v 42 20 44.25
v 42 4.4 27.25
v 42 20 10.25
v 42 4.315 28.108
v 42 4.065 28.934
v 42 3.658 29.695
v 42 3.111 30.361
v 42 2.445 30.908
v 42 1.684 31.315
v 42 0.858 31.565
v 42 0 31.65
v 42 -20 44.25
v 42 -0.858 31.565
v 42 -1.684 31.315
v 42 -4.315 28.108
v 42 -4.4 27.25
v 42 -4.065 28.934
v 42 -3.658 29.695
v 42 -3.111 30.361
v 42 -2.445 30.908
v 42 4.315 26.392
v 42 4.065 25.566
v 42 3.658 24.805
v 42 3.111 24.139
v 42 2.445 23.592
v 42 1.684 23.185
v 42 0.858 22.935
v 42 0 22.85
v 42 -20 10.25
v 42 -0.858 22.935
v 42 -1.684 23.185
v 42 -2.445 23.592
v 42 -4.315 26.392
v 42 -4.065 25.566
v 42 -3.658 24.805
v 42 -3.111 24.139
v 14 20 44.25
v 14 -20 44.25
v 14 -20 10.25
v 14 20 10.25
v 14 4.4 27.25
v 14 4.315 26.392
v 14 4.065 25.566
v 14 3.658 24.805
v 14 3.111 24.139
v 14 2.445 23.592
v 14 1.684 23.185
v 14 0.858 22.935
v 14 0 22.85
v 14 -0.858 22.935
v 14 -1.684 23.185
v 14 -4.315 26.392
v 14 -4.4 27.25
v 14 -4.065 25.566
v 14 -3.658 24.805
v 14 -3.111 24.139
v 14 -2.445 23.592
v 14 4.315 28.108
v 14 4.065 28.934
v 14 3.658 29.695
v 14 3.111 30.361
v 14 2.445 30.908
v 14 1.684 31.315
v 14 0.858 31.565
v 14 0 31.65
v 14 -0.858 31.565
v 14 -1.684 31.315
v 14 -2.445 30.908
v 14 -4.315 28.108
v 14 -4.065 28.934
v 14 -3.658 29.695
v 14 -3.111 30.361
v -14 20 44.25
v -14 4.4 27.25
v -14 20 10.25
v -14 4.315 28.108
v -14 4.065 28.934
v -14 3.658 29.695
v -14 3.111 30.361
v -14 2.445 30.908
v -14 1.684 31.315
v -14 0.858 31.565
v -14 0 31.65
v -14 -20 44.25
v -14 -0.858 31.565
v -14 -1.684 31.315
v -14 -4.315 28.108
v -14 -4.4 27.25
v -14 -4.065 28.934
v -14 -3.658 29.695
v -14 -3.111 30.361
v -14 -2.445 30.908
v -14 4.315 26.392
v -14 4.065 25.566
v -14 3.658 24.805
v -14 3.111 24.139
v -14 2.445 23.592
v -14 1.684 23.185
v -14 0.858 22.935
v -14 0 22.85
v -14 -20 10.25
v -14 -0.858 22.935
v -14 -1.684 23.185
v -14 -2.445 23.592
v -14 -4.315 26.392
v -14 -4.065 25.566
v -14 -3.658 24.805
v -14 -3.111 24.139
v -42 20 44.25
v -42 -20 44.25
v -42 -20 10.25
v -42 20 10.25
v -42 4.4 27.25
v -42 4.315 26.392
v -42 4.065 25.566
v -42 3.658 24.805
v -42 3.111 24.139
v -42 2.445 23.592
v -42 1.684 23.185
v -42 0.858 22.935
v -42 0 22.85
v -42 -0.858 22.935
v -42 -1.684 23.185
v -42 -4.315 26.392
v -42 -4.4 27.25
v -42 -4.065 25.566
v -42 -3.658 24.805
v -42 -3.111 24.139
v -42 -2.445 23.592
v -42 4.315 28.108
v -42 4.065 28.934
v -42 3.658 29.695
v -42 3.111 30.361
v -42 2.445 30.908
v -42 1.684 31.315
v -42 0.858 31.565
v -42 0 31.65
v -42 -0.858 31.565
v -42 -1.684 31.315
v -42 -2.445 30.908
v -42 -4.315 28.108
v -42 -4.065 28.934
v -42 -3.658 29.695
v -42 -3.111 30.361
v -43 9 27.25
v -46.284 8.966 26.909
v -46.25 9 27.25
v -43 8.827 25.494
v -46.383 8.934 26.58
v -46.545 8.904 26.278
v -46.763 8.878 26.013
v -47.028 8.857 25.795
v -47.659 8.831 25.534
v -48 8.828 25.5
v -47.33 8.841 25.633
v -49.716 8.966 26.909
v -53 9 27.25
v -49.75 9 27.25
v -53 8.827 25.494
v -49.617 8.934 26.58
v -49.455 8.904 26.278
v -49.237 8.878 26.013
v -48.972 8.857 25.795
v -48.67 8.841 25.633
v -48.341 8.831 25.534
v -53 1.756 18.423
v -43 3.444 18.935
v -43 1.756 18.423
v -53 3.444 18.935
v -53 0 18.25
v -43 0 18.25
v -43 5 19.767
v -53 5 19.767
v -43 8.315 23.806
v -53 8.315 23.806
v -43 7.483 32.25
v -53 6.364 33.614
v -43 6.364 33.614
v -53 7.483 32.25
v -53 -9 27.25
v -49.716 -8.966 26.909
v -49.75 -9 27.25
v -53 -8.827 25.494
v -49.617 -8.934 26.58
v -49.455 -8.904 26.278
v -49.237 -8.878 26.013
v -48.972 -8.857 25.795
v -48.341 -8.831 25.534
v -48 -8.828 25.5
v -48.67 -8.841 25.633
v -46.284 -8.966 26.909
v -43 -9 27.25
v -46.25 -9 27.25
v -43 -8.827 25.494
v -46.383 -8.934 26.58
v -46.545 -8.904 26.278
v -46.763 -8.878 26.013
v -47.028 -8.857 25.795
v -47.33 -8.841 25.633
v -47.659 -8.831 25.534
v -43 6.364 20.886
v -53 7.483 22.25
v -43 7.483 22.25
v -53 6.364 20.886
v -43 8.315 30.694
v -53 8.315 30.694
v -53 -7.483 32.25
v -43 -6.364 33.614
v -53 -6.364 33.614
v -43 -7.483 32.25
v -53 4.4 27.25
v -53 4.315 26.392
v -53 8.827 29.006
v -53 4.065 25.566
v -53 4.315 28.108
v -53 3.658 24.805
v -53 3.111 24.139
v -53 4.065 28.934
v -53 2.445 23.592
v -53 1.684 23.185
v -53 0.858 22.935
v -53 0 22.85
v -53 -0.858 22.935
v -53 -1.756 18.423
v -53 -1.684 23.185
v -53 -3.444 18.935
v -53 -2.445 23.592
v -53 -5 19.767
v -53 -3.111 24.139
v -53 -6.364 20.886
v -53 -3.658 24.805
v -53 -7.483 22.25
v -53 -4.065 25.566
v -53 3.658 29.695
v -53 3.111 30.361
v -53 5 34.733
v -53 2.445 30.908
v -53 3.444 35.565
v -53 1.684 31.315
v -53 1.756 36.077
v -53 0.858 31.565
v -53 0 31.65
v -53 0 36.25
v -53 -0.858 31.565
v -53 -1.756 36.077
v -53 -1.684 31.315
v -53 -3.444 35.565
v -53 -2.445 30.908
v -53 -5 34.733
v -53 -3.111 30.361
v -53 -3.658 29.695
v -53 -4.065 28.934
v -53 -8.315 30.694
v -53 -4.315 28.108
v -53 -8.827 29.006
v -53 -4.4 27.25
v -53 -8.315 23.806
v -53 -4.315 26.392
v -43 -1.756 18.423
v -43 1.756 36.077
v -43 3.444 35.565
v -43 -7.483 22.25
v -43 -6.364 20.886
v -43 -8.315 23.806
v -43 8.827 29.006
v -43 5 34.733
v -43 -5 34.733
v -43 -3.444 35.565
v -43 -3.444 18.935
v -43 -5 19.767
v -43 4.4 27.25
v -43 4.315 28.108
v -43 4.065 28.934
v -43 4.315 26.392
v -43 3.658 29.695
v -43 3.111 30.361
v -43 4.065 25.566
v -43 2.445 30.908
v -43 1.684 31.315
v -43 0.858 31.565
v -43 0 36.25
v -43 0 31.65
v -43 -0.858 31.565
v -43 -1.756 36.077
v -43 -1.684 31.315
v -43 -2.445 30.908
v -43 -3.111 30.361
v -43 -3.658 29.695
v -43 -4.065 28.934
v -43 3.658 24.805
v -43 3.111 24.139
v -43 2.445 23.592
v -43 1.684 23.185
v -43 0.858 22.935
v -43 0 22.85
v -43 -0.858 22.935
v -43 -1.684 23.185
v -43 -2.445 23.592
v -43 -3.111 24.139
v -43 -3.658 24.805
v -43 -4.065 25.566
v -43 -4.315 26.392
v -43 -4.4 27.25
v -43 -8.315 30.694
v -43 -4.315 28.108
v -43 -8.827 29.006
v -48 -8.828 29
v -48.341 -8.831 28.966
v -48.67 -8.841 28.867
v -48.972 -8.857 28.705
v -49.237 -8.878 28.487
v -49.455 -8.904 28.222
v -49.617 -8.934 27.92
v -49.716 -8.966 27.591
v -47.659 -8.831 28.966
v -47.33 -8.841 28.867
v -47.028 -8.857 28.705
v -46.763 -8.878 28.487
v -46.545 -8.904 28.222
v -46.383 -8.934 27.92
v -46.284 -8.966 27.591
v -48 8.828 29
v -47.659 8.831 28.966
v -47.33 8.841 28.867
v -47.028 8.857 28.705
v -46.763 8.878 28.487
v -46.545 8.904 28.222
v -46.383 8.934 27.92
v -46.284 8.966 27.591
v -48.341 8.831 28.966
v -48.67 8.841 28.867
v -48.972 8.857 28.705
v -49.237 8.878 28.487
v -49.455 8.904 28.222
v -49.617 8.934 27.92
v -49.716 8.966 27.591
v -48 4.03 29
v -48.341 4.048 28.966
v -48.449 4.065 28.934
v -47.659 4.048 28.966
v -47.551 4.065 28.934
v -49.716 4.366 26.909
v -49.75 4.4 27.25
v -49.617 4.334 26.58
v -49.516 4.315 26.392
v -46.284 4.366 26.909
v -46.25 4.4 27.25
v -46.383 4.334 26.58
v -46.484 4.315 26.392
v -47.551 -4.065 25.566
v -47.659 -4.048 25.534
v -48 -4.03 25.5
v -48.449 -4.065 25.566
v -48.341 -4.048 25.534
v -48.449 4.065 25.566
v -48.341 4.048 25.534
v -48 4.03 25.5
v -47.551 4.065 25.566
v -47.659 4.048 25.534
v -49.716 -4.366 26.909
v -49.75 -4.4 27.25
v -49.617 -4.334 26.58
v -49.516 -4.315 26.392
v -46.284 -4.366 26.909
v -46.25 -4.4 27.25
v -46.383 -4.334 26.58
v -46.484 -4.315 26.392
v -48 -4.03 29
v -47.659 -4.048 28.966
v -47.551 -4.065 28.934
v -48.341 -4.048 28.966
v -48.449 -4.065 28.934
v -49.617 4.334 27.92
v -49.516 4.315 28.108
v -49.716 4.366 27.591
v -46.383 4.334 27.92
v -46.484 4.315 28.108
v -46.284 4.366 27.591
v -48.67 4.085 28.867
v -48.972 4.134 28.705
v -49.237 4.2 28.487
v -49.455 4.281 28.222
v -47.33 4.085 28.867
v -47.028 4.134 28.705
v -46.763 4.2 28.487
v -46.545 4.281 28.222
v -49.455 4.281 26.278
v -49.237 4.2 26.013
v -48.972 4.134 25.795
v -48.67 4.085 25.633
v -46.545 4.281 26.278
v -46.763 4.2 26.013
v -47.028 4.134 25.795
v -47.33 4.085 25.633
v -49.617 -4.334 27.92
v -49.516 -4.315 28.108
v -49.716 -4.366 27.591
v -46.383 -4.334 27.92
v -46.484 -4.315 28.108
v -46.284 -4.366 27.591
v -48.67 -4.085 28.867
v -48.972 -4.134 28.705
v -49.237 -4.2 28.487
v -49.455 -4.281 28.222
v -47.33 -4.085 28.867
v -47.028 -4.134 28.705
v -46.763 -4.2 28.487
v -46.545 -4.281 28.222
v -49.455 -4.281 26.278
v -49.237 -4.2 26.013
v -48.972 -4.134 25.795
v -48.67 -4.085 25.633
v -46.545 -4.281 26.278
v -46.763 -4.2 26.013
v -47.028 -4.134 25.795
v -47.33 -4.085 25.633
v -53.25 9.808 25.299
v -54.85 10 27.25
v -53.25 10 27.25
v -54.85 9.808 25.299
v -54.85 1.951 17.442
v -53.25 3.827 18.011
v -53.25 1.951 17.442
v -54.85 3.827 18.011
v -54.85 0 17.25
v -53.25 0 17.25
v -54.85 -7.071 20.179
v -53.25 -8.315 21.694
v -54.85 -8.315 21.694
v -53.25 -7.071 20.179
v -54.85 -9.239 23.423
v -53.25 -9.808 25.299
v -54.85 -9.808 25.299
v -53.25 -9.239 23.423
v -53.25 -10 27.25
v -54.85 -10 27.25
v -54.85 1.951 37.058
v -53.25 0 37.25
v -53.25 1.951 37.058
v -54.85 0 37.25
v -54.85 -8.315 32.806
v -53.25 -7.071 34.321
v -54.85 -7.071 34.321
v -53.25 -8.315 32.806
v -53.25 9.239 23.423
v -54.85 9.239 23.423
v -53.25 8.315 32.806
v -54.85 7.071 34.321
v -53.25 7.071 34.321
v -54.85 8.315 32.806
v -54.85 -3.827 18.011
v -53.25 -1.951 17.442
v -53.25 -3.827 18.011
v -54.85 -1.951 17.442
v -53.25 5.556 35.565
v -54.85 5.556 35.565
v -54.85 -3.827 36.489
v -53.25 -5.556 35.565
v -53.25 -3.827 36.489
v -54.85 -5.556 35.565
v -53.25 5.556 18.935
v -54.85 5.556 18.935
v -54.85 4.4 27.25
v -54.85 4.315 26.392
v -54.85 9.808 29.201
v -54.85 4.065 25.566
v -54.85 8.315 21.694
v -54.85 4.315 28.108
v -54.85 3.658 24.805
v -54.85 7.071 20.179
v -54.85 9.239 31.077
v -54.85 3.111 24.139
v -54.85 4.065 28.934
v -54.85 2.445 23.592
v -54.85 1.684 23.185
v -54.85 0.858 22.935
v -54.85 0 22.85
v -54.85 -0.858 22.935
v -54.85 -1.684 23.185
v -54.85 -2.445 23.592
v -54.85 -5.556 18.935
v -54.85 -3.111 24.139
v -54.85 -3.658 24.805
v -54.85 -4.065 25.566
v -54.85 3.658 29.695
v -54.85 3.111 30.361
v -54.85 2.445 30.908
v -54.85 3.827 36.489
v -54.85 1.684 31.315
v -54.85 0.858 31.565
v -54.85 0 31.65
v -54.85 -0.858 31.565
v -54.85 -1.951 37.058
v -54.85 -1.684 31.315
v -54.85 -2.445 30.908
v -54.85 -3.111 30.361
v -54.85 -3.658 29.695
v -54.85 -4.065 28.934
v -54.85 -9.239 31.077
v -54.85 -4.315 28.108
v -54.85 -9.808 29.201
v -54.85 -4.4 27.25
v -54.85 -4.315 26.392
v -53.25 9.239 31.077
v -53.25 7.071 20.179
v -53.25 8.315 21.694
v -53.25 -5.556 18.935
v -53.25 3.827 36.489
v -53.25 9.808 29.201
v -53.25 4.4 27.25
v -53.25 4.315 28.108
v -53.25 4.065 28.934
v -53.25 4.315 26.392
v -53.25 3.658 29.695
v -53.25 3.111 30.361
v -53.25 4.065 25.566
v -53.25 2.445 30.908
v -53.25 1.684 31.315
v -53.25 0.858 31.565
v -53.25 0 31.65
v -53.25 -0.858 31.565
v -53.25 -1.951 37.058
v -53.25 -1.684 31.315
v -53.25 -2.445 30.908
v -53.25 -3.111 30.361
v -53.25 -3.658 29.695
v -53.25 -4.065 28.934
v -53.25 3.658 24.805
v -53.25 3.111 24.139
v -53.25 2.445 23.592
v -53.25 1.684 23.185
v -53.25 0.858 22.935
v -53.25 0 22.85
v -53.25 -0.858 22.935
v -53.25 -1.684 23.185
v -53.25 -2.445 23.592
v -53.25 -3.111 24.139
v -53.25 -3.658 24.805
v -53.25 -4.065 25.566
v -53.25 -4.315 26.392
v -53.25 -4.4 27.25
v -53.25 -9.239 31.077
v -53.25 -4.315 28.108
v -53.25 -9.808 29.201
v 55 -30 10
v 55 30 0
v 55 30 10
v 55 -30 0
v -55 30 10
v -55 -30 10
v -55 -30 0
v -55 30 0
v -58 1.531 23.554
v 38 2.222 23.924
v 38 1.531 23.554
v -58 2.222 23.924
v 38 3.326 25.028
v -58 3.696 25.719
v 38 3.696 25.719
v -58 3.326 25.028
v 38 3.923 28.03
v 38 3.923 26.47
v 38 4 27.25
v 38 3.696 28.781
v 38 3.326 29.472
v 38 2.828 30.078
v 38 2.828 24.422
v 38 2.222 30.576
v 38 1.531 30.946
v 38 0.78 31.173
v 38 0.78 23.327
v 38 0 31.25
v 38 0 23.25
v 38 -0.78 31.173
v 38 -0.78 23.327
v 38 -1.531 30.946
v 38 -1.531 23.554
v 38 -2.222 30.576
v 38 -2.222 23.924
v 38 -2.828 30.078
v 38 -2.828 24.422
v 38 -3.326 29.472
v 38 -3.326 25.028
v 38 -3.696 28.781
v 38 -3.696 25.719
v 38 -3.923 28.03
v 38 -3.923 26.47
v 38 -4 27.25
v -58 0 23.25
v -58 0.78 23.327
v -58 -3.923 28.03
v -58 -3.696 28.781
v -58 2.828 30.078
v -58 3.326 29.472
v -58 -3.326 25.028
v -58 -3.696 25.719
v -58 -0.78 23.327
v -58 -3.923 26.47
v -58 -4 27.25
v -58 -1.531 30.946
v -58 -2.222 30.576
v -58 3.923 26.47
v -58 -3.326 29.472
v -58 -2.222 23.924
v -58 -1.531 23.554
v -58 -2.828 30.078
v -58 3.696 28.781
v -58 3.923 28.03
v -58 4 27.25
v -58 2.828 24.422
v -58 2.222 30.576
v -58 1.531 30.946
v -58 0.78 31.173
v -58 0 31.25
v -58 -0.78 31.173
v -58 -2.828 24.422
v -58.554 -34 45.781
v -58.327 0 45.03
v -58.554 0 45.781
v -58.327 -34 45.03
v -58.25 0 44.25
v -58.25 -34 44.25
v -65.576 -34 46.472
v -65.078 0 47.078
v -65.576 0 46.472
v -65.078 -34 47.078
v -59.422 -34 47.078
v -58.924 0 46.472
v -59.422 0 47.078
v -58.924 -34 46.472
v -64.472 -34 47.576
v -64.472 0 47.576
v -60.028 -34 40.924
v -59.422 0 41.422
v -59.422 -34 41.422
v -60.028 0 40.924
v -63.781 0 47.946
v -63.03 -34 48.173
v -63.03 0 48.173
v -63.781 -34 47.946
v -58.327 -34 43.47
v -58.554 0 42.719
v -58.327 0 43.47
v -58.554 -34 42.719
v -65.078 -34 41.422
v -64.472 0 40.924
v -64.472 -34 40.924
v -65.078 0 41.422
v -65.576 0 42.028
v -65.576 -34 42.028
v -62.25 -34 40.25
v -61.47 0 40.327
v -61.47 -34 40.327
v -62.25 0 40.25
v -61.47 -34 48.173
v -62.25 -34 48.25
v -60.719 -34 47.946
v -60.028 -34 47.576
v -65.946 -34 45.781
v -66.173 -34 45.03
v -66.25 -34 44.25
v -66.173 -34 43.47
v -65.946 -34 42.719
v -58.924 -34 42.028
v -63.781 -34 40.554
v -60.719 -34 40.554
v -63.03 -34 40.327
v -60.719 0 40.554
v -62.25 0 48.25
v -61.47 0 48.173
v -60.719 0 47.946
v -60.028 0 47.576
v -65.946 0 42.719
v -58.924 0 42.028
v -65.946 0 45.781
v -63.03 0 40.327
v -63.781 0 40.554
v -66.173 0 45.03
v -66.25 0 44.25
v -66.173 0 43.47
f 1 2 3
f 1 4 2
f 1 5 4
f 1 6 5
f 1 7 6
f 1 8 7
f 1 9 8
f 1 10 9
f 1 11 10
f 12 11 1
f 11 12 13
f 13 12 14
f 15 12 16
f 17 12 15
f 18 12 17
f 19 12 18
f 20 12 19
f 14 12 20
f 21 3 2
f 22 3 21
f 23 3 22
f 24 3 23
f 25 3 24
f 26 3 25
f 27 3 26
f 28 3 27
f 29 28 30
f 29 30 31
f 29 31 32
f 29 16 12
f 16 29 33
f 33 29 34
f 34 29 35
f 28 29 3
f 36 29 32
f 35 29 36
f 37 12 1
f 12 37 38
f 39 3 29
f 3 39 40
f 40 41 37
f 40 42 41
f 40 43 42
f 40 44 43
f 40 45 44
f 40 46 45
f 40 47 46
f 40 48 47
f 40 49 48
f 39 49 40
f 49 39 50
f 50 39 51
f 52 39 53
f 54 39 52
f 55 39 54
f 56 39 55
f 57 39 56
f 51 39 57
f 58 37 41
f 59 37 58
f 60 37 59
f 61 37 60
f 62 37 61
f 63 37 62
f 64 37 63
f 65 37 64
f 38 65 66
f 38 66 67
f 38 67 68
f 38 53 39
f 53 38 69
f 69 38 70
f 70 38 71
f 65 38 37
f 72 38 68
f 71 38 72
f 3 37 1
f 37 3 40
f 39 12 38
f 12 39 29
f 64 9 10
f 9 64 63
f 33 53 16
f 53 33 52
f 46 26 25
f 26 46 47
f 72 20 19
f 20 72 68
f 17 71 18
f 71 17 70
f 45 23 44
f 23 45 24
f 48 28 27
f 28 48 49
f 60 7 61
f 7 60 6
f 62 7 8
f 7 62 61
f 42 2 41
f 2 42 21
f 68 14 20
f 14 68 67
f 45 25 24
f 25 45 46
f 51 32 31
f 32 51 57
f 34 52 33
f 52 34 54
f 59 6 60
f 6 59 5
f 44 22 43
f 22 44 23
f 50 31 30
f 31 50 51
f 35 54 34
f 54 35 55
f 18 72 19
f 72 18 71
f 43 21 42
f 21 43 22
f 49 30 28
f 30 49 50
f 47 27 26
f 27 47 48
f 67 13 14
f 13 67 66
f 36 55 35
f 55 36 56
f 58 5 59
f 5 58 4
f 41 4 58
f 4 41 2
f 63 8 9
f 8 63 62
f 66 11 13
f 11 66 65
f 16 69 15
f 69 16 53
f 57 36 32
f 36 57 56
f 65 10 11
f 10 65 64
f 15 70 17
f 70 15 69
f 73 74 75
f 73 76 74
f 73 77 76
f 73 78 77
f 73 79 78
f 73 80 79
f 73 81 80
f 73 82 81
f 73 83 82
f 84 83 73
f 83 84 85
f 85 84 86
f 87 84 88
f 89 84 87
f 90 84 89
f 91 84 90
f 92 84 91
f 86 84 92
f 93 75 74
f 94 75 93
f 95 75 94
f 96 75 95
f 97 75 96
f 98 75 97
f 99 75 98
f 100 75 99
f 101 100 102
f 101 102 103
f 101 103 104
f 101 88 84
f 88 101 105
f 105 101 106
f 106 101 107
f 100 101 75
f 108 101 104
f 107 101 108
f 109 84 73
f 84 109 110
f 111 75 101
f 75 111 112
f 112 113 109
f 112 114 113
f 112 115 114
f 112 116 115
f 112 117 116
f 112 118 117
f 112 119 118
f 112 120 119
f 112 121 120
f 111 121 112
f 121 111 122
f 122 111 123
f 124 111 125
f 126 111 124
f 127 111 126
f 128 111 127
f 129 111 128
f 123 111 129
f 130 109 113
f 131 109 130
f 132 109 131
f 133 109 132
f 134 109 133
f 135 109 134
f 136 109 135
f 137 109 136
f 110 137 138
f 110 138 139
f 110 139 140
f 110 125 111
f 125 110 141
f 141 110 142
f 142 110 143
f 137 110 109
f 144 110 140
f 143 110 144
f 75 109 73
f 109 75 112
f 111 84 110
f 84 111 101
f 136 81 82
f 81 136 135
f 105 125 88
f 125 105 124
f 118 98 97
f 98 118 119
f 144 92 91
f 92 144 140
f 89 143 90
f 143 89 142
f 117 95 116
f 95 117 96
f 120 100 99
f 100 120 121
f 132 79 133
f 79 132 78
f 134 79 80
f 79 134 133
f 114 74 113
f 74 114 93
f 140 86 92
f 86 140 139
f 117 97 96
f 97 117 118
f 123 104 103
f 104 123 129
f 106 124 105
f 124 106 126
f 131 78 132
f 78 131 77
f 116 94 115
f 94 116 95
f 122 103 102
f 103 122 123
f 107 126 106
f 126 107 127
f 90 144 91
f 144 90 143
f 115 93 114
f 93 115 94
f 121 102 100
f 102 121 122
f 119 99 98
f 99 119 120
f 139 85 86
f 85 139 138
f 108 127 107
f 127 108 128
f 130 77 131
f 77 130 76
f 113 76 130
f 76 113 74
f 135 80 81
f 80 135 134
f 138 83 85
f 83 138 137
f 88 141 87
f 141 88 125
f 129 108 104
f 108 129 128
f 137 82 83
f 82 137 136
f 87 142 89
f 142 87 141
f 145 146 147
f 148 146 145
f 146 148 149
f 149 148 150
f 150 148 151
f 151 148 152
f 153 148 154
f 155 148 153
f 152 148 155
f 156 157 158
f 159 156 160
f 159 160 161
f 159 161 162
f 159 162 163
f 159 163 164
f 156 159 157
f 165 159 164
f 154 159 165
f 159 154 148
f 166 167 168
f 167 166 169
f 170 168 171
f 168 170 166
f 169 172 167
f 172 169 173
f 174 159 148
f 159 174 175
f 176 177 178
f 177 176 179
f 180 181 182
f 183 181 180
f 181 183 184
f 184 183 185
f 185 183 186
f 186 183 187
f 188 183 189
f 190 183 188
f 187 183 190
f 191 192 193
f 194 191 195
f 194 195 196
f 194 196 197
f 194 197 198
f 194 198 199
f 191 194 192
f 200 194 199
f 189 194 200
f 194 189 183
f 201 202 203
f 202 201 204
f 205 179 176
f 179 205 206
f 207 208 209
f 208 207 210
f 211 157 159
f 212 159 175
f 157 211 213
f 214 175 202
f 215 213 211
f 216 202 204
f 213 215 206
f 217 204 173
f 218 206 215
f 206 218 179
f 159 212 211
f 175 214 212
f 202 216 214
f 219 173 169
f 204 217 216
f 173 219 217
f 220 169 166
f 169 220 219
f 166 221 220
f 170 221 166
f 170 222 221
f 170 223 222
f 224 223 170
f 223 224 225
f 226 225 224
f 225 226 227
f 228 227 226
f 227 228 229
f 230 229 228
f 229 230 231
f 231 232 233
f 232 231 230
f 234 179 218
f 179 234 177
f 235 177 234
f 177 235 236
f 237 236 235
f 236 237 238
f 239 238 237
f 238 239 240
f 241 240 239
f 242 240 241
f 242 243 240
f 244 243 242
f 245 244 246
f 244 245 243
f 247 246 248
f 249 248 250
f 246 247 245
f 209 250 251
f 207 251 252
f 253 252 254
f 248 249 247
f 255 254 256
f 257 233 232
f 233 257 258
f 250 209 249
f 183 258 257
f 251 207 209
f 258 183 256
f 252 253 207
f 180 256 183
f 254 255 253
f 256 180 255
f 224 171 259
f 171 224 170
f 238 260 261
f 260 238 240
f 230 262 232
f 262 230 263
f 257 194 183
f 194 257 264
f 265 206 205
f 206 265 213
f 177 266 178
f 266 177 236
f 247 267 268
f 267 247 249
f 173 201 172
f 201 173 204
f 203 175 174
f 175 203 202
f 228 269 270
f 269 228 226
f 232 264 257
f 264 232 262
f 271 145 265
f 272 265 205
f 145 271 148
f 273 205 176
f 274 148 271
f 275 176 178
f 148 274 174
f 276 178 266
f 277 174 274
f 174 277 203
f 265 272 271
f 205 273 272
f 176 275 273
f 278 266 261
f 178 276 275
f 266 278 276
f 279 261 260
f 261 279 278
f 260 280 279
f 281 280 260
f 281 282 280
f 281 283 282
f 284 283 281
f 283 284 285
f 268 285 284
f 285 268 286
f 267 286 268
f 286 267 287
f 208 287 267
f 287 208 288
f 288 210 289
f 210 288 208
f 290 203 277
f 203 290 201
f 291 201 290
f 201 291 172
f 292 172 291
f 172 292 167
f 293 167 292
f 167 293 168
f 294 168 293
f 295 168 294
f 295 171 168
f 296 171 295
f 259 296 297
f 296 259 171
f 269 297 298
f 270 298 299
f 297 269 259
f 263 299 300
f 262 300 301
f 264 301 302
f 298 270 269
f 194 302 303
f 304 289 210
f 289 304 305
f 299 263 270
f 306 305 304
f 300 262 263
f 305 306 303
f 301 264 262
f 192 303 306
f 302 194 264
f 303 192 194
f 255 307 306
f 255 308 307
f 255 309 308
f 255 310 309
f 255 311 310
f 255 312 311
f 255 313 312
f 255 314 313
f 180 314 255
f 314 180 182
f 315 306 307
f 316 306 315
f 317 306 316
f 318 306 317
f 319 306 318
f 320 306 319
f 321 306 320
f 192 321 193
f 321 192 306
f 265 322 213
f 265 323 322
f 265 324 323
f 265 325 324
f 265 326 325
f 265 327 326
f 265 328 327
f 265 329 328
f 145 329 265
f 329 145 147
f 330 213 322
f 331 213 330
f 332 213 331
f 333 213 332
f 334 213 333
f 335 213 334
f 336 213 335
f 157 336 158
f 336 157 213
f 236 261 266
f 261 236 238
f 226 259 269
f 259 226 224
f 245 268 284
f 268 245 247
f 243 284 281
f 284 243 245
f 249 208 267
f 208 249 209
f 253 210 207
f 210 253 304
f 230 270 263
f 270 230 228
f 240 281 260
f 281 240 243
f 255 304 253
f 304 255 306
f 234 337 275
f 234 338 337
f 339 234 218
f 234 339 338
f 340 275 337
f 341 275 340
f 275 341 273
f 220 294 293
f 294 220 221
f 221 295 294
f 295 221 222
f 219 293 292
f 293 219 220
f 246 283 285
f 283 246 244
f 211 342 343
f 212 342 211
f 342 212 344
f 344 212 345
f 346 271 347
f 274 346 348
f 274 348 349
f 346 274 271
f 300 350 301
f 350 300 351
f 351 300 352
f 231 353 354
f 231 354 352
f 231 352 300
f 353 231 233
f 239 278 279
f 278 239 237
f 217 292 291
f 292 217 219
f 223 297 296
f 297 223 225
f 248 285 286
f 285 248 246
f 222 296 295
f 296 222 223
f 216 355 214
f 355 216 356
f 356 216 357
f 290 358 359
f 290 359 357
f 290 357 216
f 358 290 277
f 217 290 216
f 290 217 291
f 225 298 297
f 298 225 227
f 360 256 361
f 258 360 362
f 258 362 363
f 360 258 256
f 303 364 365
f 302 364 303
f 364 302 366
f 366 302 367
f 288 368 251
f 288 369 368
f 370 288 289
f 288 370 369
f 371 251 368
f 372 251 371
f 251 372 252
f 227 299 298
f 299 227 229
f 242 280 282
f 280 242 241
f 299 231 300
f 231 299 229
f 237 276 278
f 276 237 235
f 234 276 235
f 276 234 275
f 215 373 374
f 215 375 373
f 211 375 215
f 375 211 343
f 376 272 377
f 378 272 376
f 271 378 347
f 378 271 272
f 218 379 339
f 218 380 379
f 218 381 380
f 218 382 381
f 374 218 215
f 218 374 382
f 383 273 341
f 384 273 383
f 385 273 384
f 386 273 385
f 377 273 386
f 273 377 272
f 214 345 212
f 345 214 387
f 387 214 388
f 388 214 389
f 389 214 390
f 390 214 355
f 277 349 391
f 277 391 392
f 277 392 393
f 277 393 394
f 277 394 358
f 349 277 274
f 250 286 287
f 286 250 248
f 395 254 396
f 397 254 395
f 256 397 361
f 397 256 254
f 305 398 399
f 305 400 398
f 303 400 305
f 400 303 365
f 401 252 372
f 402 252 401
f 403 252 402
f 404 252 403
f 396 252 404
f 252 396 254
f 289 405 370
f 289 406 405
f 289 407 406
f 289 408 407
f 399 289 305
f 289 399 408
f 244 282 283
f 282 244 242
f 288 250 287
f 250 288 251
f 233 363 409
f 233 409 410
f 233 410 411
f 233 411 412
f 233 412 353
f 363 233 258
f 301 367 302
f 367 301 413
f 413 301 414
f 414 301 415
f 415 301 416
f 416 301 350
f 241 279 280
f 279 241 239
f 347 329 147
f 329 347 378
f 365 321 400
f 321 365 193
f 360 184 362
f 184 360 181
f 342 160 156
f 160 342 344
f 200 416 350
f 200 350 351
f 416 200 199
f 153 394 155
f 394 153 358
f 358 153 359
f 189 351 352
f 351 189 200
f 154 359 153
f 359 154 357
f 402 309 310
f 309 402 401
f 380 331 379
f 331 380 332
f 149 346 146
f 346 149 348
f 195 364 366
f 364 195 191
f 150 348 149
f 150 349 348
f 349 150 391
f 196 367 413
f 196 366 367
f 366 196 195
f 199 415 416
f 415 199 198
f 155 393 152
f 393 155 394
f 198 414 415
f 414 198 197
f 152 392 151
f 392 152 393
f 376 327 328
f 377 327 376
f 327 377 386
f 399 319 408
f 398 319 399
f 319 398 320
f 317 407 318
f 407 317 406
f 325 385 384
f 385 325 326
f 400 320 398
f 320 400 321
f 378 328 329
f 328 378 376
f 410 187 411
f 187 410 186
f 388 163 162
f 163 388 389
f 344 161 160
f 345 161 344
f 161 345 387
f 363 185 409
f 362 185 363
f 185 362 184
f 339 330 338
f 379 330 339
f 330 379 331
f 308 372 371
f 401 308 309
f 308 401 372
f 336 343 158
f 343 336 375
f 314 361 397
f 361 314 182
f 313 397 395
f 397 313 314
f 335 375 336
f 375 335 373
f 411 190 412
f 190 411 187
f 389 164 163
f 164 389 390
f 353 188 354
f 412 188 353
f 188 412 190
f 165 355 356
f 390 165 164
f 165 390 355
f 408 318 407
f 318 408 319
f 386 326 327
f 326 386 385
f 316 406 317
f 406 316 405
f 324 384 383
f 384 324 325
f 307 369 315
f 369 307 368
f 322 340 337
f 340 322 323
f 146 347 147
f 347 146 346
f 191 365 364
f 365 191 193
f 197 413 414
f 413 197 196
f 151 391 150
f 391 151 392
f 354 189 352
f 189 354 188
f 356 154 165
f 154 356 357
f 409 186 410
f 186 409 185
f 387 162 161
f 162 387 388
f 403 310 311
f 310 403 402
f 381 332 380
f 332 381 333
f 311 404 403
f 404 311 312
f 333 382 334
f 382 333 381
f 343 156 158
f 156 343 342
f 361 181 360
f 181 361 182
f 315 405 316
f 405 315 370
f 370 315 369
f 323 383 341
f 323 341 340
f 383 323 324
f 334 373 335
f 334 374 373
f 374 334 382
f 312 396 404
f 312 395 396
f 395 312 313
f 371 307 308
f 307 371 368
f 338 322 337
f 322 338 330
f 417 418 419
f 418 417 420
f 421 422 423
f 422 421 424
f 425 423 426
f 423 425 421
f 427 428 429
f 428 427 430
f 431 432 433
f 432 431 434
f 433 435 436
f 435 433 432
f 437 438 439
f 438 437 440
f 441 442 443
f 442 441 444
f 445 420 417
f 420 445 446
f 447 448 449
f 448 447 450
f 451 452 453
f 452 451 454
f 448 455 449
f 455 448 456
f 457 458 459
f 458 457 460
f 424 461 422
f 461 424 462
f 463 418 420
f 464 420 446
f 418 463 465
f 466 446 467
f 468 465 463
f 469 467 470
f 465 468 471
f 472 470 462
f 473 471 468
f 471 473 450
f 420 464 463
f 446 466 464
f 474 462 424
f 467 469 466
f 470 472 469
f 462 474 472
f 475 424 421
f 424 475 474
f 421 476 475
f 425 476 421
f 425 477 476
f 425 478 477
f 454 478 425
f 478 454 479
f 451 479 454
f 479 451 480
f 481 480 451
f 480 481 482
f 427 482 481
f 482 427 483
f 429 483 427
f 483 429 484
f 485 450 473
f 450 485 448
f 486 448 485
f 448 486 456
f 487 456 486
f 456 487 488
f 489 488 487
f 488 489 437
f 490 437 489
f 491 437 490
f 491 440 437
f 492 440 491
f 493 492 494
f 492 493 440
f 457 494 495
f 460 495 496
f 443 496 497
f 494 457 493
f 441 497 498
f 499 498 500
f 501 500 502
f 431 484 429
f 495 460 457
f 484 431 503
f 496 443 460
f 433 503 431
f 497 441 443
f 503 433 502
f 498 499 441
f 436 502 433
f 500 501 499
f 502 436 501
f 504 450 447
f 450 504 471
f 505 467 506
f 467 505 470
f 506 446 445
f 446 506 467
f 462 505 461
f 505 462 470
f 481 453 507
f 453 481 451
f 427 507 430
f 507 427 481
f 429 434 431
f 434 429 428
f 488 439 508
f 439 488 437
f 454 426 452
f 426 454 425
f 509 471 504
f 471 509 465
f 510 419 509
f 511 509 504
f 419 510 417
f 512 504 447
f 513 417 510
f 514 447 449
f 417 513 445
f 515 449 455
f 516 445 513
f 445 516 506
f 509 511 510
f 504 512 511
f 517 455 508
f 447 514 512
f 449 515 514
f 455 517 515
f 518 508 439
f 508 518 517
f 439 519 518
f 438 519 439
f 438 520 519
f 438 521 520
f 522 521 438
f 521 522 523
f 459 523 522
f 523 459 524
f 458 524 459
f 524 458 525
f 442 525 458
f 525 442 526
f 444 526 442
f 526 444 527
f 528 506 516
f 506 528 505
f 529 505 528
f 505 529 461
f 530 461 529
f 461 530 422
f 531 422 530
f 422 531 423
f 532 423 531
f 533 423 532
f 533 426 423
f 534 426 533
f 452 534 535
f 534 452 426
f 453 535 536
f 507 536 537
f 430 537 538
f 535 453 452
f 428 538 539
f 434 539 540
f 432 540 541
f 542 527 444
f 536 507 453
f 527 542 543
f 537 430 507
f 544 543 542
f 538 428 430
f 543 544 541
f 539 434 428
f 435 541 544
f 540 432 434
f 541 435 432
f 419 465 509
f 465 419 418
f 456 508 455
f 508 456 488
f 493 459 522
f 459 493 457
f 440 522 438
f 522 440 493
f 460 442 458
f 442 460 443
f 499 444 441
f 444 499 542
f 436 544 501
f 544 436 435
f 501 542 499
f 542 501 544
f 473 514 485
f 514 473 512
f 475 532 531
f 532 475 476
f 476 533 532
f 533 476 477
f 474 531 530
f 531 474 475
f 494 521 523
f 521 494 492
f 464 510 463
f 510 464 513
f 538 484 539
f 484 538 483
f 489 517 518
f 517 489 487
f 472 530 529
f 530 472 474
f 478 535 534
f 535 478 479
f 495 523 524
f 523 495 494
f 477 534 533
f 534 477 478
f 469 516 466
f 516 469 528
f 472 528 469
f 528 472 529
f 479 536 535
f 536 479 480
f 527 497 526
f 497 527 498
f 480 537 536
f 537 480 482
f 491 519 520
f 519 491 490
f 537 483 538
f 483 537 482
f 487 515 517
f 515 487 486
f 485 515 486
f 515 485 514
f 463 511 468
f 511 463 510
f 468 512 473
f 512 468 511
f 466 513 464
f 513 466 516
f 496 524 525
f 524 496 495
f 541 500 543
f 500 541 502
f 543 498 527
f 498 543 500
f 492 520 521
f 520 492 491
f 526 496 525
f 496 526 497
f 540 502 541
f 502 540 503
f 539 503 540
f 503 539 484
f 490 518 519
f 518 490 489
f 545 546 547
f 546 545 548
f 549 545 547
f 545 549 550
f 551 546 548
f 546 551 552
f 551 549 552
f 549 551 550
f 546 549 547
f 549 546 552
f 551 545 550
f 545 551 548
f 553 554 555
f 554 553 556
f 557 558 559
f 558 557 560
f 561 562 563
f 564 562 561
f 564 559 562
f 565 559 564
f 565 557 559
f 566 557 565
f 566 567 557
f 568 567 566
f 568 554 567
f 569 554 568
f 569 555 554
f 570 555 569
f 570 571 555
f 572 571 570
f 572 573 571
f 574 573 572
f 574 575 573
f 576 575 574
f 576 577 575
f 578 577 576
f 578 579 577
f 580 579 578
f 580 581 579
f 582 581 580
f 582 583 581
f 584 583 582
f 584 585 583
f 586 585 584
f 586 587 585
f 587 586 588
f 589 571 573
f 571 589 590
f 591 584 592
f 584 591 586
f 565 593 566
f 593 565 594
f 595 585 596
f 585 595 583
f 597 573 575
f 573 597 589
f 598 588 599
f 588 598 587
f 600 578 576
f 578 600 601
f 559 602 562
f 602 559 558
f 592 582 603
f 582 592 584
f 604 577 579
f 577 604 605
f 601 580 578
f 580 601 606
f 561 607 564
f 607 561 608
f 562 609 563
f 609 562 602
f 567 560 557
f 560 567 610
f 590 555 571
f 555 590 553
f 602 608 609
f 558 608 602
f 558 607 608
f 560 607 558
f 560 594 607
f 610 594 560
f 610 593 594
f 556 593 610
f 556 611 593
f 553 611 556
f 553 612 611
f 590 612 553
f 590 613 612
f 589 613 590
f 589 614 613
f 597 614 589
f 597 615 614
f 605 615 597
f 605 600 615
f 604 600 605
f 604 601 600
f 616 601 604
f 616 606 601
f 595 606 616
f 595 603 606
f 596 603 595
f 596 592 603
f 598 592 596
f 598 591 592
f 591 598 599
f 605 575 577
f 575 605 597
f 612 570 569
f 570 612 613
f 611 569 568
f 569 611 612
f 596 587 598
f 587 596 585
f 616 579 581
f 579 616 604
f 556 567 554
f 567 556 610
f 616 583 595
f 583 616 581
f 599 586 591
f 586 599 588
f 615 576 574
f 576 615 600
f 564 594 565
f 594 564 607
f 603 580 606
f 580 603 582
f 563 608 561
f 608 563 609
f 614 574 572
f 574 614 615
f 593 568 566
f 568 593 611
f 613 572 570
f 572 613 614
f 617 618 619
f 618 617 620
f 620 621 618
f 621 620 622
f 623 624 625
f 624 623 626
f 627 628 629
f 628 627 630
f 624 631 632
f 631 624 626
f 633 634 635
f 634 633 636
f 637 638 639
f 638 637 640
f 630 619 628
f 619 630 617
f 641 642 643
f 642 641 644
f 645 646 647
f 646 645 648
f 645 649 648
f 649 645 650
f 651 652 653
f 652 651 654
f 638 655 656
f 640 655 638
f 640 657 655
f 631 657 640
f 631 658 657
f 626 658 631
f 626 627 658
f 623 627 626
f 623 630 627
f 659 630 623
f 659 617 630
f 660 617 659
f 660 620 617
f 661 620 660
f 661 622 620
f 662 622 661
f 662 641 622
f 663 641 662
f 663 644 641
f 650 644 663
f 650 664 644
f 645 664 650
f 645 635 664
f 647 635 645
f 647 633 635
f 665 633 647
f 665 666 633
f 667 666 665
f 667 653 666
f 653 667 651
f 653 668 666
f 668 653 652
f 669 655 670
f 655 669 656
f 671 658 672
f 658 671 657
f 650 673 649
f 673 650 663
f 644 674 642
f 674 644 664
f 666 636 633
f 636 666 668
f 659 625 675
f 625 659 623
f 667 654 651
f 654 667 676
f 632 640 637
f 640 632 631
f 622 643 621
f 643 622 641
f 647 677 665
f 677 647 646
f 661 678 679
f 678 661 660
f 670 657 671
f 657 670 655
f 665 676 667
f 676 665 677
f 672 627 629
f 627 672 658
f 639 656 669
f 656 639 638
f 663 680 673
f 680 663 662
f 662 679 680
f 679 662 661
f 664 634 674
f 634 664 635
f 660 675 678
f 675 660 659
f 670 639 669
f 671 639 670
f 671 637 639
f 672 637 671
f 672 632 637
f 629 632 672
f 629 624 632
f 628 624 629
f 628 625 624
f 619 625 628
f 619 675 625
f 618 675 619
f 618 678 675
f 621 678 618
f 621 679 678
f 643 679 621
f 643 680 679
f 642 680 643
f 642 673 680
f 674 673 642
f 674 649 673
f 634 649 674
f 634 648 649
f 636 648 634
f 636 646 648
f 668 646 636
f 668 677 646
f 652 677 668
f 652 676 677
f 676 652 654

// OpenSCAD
$fn = 32;

// ------------------------------------------------------------------------
// Machine vise: screw d8, jaws 28 x 34 mm
// Every part is its own module, assembly() places every instance.
// ------------------------------------------------------------------------

// --- part 1 ---
module vise_bed() {
  difference() {
    translate([-55, -30, 0]) cube([110, 60, 10]);
  }
}

// --- part 2 ---
module vise_jaw() {
  difference() {
    translate([-14, -20, 0]) cube([28, 40, 34]);
    translate([0, 0, 17]) rotate([0, 90, 0]) cylinder(h = 30, d = 8.8, center = true);
  }
}

// --- part 3 ---
module vise_screw() {
  translate([0, 0, -48]) cylinder(h = 96, d = 8);
}

// --- part 4 ---
module screw_collar() {
  difference() {
    cylinder(h = 10, d = 18);
    translate([0, 0, -1]) cylinder(h = 12, d = 8.8);
    translate([0, 0, 5]) rotate([90, 0, 0]) cylinder(h = 20, d = 3.5, center = true);
  }
}

// --- part 5 ---
module screw_washer() {
  difference() {
      translate([0, 0, 0]) cylinder(h = 1.6, d = 20);
      translate([0, 0, -1]) cylinder(h = 3.6, d = 8.8);
    }
}

// --- part 6 ---
module vise_handle() {
  cylinder(h = 34, d = 8);
}

// --- assembly ---
module assembly() {
  color([0.80, 0.24, 0.20]) translate([0, 0, 0]) rotate([0, 0, 0]) vise_bed();
  color([0.20, 0.45, 0.75]) translate([28, 0, 10.25]) rotate([0, 0, 0]) vise_jaw();
  color([0.25, 0.62, 0.32]) translate([-28, 0, 10.25]) rotate([0, 0, 0]) vise_jaw();
  color([0.92, 0.70, 0.18]) translate([-10, 0, 27.25]) rotate([0, 90, 0]) vise_screw();
  color([0.58, 0.35, 0.70]) translate([-53, 0, 27.25]) rotate([0, 90, 0]) screw_collar();
  color([0.16, 0.66, 0.66]) translate([-54.85, 0, 27.25]) rotate([0, 90, 0]) screw_washer();
  color([0.85, 0.48, 0.18]) translate([-62.25, 0, 44.25]) rotate([90, 0, 0]) vise_handle();
}

assembly();
